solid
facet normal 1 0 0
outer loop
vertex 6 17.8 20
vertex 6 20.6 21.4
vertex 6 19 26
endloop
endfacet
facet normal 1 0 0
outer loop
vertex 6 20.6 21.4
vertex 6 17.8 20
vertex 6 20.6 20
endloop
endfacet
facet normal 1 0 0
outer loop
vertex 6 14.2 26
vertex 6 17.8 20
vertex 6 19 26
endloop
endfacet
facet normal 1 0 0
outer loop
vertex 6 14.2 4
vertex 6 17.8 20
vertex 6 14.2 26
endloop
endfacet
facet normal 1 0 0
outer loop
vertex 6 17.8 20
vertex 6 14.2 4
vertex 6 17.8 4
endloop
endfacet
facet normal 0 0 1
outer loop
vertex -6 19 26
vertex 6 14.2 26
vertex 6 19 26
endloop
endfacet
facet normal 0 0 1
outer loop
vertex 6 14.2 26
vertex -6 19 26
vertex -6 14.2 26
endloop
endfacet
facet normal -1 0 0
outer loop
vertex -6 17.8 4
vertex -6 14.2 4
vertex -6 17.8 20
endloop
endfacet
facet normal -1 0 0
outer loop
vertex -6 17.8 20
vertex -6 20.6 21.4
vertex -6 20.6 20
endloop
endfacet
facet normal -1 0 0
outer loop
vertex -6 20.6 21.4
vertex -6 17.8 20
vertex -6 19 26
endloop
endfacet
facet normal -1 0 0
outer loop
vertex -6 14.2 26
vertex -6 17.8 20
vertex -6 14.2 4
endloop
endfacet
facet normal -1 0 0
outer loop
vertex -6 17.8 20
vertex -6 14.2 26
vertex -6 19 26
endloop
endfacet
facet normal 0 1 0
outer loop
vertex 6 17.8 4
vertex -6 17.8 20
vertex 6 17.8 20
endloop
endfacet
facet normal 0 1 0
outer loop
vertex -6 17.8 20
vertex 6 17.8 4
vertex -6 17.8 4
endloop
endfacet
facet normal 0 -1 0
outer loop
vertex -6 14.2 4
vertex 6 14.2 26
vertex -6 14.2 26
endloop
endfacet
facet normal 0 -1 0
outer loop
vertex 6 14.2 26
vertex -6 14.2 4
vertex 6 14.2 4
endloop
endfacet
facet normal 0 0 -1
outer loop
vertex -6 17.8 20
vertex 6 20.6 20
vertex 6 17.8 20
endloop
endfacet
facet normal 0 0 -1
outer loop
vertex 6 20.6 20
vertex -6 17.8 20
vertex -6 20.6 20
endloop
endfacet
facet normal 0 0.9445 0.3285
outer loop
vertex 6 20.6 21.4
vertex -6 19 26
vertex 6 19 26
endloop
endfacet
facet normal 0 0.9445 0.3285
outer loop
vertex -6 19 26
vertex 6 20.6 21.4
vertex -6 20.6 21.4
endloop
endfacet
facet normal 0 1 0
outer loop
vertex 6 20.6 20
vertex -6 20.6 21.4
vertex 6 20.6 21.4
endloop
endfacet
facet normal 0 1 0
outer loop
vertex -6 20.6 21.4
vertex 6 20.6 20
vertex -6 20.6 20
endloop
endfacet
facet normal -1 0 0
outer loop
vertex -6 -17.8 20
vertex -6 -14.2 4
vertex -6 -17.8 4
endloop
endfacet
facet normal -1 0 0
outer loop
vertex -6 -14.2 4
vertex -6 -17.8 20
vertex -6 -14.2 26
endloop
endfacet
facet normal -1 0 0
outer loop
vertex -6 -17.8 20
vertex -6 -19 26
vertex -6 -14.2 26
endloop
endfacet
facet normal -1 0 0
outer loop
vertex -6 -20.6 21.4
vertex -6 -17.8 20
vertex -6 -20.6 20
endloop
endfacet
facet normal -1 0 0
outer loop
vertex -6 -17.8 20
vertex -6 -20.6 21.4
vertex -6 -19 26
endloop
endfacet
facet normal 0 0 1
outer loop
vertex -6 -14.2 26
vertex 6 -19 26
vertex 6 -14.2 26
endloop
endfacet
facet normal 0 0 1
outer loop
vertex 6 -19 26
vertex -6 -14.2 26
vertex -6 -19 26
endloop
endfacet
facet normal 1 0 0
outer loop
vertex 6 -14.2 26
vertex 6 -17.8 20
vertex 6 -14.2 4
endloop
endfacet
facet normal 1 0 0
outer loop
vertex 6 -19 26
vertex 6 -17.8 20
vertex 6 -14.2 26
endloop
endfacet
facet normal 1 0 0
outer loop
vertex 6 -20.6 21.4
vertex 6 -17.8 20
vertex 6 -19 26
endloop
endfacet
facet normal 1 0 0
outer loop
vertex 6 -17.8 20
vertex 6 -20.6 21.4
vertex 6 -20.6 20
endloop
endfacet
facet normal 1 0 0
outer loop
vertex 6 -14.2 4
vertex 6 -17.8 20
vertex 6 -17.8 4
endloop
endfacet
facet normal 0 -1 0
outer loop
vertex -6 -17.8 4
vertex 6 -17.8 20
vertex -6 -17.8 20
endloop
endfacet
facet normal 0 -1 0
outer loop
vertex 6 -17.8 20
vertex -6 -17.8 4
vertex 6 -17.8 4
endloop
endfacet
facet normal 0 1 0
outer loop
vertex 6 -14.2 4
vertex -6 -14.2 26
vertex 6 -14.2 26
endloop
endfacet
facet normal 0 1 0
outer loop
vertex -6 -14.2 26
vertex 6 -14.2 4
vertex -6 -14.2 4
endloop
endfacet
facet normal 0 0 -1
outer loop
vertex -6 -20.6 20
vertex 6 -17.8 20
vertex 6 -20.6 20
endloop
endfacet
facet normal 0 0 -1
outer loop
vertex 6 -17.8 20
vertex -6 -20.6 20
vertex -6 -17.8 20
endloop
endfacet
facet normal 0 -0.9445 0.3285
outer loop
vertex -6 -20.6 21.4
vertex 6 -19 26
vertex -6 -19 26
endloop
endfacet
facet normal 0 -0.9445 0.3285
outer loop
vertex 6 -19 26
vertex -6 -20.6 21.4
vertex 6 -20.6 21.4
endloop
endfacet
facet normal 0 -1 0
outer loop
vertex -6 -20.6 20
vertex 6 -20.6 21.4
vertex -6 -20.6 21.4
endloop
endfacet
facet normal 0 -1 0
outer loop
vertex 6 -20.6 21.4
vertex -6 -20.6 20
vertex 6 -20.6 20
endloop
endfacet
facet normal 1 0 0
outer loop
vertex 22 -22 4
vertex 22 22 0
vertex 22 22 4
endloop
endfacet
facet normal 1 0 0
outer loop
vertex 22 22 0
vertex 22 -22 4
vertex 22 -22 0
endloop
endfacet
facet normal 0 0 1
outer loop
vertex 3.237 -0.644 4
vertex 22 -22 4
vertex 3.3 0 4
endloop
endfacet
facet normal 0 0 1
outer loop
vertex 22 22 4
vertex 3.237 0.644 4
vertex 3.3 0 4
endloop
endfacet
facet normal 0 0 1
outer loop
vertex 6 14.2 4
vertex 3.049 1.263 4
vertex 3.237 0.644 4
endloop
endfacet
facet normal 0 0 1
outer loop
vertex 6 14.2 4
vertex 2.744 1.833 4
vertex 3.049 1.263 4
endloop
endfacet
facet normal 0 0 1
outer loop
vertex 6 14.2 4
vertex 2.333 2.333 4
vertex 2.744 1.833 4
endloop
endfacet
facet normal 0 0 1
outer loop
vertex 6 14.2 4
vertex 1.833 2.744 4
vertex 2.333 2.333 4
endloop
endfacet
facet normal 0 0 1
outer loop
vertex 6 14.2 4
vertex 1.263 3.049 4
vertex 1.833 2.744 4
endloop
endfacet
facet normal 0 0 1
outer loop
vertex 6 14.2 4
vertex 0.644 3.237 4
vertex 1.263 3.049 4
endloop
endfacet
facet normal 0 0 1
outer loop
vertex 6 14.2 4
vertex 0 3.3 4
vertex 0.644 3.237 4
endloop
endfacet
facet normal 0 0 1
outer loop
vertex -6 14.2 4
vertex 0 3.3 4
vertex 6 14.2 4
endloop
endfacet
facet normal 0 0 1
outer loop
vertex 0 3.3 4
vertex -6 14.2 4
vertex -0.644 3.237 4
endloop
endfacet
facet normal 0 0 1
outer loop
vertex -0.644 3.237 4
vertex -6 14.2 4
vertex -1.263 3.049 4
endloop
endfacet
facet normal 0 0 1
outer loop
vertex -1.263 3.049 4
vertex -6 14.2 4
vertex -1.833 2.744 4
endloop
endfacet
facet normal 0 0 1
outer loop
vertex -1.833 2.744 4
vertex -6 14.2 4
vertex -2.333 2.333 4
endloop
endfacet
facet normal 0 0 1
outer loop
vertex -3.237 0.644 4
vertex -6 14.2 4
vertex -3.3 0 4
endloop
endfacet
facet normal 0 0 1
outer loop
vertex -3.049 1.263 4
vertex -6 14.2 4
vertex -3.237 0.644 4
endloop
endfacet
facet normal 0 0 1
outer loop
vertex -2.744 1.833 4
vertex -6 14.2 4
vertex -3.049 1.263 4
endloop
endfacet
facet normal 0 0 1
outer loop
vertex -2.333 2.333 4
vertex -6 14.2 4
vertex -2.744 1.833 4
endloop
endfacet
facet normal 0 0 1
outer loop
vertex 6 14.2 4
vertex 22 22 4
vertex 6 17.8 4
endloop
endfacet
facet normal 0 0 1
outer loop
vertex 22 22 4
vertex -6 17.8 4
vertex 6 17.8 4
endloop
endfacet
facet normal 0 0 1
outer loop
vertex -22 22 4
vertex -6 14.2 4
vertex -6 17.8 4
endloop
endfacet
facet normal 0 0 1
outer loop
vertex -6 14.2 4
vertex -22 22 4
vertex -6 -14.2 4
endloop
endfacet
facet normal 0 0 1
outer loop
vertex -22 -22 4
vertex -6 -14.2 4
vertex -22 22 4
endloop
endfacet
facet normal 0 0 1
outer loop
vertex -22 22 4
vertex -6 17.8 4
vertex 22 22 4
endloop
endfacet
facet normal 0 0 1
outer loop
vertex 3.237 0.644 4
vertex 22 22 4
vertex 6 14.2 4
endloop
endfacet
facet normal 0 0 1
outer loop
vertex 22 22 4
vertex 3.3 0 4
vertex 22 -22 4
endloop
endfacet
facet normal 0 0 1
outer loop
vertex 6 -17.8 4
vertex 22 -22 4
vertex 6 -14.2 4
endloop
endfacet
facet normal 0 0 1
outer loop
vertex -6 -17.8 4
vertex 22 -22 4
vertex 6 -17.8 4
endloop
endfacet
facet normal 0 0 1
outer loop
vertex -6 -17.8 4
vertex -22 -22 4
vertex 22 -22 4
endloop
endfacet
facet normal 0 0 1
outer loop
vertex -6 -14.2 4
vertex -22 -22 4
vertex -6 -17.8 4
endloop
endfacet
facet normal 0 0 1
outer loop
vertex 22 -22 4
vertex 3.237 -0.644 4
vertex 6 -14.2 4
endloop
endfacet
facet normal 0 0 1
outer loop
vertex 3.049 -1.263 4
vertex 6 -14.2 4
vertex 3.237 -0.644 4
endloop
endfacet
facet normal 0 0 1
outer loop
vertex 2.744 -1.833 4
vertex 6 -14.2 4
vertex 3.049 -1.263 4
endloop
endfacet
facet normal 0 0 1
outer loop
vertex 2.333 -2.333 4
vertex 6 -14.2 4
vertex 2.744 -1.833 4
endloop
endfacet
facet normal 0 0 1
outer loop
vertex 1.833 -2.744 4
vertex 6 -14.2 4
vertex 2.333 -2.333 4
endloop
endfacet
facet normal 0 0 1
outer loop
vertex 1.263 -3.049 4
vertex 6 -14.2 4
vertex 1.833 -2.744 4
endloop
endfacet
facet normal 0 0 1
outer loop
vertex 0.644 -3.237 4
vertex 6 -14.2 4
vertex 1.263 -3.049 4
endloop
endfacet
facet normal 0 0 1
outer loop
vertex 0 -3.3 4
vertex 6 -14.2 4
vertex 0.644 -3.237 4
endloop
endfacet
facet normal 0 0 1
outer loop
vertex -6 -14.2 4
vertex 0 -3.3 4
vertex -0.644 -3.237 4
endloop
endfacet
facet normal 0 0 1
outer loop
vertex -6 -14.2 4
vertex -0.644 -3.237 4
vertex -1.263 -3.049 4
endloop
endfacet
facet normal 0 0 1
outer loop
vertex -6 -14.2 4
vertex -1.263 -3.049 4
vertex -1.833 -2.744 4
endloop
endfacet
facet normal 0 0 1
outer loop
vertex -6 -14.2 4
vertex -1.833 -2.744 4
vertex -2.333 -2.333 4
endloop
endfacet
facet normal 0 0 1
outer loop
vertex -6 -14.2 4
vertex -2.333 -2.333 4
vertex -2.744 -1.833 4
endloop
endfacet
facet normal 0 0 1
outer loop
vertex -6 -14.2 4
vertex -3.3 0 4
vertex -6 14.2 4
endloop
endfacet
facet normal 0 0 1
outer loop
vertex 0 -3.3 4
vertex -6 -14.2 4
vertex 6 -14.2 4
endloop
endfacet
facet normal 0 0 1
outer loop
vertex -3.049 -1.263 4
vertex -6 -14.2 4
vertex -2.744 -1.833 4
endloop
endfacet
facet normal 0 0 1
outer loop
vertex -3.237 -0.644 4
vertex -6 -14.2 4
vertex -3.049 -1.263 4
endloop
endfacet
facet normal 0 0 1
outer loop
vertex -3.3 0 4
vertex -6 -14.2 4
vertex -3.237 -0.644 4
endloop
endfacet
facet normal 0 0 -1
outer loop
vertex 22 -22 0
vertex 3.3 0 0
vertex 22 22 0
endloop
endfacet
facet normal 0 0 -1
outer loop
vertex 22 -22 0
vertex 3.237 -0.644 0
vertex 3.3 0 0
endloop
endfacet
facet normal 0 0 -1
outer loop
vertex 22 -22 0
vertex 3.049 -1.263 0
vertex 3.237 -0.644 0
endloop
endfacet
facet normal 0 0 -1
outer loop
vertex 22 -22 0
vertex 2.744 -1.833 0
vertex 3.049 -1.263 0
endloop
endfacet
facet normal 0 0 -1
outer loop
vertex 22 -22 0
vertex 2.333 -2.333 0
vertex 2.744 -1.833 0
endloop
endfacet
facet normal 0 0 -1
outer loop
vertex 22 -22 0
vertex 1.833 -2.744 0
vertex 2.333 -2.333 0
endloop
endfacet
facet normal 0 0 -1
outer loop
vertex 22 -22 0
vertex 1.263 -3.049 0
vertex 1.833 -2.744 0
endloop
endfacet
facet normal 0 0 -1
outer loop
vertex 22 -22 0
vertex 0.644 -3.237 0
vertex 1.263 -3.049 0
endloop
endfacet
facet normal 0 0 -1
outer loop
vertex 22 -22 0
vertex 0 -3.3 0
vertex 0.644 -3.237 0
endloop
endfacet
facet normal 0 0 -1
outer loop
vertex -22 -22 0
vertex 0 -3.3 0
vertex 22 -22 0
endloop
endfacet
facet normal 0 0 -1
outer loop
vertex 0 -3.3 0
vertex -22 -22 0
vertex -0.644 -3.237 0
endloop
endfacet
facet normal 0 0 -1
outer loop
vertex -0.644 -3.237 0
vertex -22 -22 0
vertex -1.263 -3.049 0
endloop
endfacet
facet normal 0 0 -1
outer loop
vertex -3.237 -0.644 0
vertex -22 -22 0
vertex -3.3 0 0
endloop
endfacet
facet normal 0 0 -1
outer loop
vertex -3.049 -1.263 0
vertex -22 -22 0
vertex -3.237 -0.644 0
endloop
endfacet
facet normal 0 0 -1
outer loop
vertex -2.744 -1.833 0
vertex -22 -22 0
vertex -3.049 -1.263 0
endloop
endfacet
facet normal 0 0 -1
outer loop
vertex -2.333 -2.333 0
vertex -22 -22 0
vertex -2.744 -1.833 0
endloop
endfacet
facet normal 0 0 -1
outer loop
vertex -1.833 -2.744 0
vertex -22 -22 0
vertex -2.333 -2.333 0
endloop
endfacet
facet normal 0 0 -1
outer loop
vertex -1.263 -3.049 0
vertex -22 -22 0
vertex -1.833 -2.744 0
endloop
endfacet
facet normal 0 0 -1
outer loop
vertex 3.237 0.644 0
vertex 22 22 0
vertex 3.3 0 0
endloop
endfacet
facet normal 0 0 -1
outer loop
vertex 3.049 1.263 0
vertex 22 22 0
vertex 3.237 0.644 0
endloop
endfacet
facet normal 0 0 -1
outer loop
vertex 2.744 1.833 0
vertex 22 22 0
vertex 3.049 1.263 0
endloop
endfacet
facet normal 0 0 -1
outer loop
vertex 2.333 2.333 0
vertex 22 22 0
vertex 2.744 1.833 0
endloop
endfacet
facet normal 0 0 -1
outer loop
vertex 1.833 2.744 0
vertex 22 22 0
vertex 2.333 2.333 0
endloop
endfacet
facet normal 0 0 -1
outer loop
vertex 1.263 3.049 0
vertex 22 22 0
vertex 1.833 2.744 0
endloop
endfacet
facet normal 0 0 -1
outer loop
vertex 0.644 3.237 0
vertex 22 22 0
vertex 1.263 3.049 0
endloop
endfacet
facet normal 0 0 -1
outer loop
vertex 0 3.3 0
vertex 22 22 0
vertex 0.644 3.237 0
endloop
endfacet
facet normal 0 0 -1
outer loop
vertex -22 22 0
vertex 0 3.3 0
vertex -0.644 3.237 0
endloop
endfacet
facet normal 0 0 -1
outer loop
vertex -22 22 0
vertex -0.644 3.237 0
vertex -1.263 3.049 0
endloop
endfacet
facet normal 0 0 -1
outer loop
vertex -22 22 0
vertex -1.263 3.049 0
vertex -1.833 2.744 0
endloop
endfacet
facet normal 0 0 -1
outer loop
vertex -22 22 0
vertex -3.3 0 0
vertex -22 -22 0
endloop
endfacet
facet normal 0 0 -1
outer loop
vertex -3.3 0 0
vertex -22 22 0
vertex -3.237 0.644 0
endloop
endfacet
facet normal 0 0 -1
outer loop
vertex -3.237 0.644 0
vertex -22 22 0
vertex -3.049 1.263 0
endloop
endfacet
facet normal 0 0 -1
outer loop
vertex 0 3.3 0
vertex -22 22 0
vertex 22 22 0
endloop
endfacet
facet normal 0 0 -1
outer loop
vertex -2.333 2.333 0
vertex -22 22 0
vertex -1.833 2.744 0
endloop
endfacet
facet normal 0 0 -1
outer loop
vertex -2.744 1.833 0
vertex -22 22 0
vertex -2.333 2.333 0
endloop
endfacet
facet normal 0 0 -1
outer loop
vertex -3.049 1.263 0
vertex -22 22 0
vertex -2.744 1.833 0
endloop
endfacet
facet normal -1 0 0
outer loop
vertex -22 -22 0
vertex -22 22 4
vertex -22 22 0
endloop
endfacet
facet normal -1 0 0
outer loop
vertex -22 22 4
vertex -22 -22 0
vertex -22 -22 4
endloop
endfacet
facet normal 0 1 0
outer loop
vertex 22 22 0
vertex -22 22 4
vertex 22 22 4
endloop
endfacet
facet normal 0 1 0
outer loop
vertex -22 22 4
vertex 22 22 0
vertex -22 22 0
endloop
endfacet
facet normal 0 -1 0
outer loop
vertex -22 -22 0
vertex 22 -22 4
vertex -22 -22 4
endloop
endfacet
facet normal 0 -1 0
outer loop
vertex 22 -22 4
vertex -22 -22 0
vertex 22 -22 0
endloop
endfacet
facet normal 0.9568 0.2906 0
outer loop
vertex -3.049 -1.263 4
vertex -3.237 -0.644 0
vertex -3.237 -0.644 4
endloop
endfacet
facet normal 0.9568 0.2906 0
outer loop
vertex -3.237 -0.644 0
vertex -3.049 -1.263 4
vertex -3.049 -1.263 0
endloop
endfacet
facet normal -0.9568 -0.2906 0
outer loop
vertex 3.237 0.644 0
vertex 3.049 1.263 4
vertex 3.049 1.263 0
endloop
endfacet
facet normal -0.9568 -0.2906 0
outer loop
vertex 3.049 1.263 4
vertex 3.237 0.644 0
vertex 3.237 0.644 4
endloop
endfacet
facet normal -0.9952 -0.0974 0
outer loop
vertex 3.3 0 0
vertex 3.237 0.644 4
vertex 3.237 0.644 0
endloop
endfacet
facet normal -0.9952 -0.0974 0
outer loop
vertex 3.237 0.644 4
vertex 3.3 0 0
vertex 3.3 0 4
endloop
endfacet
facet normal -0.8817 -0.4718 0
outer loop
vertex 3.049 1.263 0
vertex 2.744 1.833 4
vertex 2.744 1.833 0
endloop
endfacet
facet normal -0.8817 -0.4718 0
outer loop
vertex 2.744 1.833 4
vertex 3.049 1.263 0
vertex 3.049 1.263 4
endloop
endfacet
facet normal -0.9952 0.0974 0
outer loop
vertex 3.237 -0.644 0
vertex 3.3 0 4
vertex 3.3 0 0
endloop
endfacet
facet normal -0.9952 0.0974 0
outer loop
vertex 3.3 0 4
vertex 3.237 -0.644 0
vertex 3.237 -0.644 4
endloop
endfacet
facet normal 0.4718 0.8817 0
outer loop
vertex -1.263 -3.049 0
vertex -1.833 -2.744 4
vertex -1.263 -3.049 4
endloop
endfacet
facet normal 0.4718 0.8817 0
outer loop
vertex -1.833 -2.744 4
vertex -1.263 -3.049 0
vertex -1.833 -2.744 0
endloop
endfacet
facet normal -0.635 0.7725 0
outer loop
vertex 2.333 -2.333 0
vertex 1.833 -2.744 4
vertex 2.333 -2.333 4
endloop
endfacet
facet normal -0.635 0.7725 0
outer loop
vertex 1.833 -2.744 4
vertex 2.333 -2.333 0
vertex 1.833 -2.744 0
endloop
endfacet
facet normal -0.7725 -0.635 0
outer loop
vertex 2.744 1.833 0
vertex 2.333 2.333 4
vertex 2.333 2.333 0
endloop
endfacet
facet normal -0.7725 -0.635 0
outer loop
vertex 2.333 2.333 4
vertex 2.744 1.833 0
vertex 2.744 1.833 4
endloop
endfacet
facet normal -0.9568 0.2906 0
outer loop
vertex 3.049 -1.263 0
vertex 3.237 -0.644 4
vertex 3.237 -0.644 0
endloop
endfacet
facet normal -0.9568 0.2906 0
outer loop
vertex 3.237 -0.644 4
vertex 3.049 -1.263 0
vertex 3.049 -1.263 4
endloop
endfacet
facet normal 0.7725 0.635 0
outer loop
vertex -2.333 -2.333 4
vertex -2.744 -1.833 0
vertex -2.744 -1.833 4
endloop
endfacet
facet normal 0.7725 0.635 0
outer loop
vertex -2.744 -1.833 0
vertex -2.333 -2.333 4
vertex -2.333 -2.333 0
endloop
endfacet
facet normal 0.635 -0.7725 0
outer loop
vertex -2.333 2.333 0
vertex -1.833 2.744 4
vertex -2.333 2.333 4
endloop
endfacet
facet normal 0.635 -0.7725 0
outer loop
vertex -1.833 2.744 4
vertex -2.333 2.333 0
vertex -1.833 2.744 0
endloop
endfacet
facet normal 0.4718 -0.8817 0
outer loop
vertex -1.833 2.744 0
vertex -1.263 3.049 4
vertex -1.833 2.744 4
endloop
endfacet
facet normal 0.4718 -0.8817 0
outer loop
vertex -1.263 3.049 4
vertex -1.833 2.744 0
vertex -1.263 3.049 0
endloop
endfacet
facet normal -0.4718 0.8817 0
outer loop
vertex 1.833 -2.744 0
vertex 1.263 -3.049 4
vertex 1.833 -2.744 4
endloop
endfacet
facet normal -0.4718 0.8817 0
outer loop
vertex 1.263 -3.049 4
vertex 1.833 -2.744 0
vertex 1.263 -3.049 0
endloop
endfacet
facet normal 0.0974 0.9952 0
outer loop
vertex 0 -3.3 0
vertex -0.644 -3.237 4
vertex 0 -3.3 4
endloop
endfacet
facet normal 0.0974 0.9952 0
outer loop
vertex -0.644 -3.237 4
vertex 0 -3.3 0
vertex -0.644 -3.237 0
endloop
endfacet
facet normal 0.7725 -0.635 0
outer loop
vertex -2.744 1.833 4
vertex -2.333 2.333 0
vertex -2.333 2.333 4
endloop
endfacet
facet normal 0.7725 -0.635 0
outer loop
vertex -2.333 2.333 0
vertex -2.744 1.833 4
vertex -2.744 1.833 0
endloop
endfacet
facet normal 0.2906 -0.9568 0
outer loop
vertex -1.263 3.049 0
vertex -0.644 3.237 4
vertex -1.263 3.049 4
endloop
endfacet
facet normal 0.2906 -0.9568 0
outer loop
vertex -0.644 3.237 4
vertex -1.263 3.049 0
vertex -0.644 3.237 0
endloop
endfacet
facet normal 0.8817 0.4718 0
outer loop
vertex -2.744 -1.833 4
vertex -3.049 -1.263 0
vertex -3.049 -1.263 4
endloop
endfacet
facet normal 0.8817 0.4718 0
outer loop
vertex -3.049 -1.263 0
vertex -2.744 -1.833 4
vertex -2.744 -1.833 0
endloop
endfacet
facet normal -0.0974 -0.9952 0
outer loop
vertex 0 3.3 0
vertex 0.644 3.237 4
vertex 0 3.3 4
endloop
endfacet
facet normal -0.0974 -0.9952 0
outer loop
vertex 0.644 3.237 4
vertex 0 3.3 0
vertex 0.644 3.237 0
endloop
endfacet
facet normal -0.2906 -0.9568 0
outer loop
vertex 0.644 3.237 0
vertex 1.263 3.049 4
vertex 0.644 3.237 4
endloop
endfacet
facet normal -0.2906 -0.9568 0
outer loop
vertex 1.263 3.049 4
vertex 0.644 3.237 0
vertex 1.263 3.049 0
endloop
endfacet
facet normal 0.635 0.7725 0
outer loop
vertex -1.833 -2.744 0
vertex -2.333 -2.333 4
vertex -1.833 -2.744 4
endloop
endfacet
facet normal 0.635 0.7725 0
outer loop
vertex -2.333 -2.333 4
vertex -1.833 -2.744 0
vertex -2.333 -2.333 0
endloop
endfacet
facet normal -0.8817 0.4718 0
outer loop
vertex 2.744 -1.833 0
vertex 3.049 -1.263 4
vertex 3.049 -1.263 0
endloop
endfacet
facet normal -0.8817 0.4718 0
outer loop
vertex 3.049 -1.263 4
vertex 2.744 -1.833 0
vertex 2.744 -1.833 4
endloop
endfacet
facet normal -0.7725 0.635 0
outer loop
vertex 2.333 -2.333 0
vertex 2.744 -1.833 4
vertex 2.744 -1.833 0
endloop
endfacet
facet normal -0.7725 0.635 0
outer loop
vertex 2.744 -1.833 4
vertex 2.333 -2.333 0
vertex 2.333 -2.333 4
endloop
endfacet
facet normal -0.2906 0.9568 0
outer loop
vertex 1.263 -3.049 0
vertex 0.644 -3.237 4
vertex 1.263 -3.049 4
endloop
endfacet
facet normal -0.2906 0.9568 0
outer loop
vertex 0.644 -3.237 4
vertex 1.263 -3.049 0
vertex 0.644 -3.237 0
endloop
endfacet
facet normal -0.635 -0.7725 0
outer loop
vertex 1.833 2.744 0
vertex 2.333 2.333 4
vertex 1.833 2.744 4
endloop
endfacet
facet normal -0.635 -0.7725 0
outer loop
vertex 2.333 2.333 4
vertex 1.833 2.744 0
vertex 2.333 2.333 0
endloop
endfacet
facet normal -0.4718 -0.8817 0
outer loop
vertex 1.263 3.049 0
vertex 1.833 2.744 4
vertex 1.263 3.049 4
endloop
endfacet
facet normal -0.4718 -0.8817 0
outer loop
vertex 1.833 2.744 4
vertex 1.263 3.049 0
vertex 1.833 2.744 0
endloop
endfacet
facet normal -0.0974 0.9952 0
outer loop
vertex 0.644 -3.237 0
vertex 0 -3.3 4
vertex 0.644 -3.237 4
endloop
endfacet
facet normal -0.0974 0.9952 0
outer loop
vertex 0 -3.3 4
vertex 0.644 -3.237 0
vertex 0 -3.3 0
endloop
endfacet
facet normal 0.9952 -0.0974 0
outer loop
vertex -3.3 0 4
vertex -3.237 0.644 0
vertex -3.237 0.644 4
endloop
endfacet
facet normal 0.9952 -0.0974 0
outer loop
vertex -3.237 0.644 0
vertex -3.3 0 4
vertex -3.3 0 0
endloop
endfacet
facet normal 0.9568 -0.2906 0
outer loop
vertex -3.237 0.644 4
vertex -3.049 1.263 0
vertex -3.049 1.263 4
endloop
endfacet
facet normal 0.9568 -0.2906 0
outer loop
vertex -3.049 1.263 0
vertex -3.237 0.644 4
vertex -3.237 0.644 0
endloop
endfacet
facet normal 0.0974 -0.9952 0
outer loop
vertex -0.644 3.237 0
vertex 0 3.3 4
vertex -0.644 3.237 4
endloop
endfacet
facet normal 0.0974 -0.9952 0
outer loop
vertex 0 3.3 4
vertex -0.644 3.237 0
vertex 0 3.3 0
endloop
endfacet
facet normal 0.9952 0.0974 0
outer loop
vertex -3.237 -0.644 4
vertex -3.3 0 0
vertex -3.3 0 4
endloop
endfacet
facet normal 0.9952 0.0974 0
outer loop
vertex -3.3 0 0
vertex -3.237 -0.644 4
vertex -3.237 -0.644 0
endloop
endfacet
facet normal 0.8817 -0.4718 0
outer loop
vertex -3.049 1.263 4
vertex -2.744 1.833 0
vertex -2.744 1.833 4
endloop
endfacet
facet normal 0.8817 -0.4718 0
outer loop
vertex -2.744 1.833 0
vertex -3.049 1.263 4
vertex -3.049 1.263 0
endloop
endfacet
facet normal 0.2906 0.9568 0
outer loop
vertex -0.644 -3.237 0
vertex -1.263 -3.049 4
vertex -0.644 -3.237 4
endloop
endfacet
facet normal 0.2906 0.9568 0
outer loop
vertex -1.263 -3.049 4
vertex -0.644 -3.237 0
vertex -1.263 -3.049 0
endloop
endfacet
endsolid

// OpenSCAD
$fn = 32;

// ----------------------------------------------------------------------
// Snap-fit latch: 2 arms, 22 mm tall, 3 mm undercut hooks
// ----------------------------------------------------------------------

// --- parameters (mm) ---
base_d = 44;              // base plate depth
base_h = 4;               // base plate thickness
span = 32;                // distance between opposite arms
arm_t = 3.6;              // arm thickness
arm_d = 12;               // arm width
height = 22;              // free arm length
head_len = 3;             // hook reach
head_h = 6;               // hook height
lead = 1.4;               // lead-in ramp thickness
bore_d = 6.6;             // base fixing bore
top_z = 26;               // height of the arm tips above the base

arms = 2;

difference() {
  union() {
    /* base plate, centred on the arm ring */
    translate([-22, -22, 0]) cube([base_d, base_d, base_h]);
    for (a = [0 : 360 / arms : 359]) rotate([0, 0, a]) {
    /* arm, sunk 0.5 mm into the base */
    translate([-arm_d / 2, span / 2 - arm_t / 2, base_h - 0.5]) cube([arm_d, arm_t, height + 0.5]);
    /* hook: a convex hull of a tall inner block and a thin outer lip
       gives a flat undercut below and a lead-in ramp on top */
    hull() {
      translate([-arm_d / 2, span / 2 + arm_t / 2 - 0.6, top_z - head_h]) cube([arm_d, lead + 0.4, head_h]);
      translate([-arm_d / 2, span / 2 + arm_t / 2 - 0.2, top_z - head_h]) cube([arm_d, head_len, lead]);
    }
    }
  }
  translate([0, 0, -2.5]) cylinder(h = base_h + 5, d = bore_d);
}
